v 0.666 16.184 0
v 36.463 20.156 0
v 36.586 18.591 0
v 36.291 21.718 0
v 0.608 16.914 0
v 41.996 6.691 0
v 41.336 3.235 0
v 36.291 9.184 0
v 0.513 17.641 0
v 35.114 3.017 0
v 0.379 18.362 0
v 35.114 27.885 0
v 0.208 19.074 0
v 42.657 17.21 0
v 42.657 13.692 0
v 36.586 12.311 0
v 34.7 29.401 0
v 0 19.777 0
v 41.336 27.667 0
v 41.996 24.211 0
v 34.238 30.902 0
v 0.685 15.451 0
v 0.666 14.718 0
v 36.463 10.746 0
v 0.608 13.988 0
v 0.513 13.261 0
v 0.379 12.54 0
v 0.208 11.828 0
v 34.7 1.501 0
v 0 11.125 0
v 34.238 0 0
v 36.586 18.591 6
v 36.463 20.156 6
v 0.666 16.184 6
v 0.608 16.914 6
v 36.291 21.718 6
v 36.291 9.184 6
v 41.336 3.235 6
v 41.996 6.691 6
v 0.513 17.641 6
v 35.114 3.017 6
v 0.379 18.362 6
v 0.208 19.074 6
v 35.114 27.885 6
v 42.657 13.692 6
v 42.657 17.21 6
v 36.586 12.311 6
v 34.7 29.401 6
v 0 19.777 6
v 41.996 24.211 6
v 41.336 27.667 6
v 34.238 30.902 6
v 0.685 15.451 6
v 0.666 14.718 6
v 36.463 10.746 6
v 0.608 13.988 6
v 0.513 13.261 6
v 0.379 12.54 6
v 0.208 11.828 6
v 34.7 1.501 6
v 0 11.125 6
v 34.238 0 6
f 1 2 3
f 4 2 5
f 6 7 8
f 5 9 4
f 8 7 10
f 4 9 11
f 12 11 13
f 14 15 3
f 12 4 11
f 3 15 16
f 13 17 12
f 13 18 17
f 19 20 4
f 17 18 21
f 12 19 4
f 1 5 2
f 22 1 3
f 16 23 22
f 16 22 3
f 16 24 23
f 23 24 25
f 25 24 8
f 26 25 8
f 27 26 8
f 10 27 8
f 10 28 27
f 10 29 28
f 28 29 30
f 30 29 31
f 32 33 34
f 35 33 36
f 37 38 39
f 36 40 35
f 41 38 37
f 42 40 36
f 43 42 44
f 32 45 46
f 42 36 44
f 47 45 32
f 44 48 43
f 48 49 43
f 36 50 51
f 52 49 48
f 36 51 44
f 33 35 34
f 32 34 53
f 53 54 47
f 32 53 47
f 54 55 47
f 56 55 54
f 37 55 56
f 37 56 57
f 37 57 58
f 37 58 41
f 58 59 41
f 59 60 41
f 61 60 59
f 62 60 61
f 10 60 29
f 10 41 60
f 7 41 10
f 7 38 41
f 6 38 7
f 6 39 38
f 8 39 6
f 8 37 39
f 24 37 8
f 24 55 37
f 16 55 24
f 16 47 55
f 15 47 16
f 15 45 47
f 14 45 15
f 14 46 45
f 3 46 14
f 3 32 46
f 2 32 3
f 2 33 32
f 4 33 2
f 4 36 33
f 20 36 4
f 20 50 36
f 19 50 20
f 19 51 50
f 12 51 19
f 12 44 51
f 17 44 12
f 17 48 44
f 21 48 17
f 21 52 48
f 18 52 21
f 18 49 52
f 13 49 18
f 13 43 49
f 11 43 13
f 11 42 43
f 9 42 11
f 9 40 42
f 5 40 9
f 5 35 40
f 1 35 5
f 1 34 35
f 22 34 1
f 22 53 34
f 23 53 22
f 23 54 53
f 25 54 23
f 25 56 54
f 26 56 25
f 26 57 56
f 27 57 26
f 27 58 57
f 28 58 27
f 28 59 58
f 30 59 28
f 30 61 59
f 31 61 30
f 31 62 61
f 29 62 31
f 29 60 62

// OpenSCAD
$fn = 32;

// ----------------------------------------------------------------------
// Gear sector: 3 teeth on 36 degrees
// ----------------------------------------------------------------------

// --- parameters (mm) ---
sector_angle = 36;        // sector angle, degrees
root_r = 50;              // root circle radius
tooth_h = 6;              // tooth height over the root circle
teeth = 3;                // number of teeth on the sector
hub_r = 14;               // hub bore radius
plate_t = 6;              // sector thickness, Z
arc_step = 3;             // sampling step of the root/hub arcs, degrees

tip_r = root_r + tooth_h;  // tip circle radius

profile = [[34.238, 0], [34.7, 1.501], [35.114, 3.017], [41.336, 3.235], [41.996, 6.691], [36.291, 9.184], [36.463, 10.746], [36.586, 12.311], [42.657, 13.692], [42.657, 17.21], [36.586, 18.591], [36.463, 20.156], [36.291, 21.718], [41.996, 24.211], [41.336, 27.667], [35.114, 27.885], [34.7, 29.401], [34.238, 30.902], [0, 19.777], [0.208, 19.074], [0.379, 18.362], [0.513, 17.641], [0.608, 16.914], [0.666, 16.184], [0.685, 15.451], [0.666, 14.718], [0.608, 13.988], [0.513, 13.261], [0.379, 12.54], [0.208, 11.828], [0, 11.125]];  // primary outline, 31 points, counter clockwise

// --- the one profile operation ---
linear_extrude(height = plate_t) polygon(points = profile);
